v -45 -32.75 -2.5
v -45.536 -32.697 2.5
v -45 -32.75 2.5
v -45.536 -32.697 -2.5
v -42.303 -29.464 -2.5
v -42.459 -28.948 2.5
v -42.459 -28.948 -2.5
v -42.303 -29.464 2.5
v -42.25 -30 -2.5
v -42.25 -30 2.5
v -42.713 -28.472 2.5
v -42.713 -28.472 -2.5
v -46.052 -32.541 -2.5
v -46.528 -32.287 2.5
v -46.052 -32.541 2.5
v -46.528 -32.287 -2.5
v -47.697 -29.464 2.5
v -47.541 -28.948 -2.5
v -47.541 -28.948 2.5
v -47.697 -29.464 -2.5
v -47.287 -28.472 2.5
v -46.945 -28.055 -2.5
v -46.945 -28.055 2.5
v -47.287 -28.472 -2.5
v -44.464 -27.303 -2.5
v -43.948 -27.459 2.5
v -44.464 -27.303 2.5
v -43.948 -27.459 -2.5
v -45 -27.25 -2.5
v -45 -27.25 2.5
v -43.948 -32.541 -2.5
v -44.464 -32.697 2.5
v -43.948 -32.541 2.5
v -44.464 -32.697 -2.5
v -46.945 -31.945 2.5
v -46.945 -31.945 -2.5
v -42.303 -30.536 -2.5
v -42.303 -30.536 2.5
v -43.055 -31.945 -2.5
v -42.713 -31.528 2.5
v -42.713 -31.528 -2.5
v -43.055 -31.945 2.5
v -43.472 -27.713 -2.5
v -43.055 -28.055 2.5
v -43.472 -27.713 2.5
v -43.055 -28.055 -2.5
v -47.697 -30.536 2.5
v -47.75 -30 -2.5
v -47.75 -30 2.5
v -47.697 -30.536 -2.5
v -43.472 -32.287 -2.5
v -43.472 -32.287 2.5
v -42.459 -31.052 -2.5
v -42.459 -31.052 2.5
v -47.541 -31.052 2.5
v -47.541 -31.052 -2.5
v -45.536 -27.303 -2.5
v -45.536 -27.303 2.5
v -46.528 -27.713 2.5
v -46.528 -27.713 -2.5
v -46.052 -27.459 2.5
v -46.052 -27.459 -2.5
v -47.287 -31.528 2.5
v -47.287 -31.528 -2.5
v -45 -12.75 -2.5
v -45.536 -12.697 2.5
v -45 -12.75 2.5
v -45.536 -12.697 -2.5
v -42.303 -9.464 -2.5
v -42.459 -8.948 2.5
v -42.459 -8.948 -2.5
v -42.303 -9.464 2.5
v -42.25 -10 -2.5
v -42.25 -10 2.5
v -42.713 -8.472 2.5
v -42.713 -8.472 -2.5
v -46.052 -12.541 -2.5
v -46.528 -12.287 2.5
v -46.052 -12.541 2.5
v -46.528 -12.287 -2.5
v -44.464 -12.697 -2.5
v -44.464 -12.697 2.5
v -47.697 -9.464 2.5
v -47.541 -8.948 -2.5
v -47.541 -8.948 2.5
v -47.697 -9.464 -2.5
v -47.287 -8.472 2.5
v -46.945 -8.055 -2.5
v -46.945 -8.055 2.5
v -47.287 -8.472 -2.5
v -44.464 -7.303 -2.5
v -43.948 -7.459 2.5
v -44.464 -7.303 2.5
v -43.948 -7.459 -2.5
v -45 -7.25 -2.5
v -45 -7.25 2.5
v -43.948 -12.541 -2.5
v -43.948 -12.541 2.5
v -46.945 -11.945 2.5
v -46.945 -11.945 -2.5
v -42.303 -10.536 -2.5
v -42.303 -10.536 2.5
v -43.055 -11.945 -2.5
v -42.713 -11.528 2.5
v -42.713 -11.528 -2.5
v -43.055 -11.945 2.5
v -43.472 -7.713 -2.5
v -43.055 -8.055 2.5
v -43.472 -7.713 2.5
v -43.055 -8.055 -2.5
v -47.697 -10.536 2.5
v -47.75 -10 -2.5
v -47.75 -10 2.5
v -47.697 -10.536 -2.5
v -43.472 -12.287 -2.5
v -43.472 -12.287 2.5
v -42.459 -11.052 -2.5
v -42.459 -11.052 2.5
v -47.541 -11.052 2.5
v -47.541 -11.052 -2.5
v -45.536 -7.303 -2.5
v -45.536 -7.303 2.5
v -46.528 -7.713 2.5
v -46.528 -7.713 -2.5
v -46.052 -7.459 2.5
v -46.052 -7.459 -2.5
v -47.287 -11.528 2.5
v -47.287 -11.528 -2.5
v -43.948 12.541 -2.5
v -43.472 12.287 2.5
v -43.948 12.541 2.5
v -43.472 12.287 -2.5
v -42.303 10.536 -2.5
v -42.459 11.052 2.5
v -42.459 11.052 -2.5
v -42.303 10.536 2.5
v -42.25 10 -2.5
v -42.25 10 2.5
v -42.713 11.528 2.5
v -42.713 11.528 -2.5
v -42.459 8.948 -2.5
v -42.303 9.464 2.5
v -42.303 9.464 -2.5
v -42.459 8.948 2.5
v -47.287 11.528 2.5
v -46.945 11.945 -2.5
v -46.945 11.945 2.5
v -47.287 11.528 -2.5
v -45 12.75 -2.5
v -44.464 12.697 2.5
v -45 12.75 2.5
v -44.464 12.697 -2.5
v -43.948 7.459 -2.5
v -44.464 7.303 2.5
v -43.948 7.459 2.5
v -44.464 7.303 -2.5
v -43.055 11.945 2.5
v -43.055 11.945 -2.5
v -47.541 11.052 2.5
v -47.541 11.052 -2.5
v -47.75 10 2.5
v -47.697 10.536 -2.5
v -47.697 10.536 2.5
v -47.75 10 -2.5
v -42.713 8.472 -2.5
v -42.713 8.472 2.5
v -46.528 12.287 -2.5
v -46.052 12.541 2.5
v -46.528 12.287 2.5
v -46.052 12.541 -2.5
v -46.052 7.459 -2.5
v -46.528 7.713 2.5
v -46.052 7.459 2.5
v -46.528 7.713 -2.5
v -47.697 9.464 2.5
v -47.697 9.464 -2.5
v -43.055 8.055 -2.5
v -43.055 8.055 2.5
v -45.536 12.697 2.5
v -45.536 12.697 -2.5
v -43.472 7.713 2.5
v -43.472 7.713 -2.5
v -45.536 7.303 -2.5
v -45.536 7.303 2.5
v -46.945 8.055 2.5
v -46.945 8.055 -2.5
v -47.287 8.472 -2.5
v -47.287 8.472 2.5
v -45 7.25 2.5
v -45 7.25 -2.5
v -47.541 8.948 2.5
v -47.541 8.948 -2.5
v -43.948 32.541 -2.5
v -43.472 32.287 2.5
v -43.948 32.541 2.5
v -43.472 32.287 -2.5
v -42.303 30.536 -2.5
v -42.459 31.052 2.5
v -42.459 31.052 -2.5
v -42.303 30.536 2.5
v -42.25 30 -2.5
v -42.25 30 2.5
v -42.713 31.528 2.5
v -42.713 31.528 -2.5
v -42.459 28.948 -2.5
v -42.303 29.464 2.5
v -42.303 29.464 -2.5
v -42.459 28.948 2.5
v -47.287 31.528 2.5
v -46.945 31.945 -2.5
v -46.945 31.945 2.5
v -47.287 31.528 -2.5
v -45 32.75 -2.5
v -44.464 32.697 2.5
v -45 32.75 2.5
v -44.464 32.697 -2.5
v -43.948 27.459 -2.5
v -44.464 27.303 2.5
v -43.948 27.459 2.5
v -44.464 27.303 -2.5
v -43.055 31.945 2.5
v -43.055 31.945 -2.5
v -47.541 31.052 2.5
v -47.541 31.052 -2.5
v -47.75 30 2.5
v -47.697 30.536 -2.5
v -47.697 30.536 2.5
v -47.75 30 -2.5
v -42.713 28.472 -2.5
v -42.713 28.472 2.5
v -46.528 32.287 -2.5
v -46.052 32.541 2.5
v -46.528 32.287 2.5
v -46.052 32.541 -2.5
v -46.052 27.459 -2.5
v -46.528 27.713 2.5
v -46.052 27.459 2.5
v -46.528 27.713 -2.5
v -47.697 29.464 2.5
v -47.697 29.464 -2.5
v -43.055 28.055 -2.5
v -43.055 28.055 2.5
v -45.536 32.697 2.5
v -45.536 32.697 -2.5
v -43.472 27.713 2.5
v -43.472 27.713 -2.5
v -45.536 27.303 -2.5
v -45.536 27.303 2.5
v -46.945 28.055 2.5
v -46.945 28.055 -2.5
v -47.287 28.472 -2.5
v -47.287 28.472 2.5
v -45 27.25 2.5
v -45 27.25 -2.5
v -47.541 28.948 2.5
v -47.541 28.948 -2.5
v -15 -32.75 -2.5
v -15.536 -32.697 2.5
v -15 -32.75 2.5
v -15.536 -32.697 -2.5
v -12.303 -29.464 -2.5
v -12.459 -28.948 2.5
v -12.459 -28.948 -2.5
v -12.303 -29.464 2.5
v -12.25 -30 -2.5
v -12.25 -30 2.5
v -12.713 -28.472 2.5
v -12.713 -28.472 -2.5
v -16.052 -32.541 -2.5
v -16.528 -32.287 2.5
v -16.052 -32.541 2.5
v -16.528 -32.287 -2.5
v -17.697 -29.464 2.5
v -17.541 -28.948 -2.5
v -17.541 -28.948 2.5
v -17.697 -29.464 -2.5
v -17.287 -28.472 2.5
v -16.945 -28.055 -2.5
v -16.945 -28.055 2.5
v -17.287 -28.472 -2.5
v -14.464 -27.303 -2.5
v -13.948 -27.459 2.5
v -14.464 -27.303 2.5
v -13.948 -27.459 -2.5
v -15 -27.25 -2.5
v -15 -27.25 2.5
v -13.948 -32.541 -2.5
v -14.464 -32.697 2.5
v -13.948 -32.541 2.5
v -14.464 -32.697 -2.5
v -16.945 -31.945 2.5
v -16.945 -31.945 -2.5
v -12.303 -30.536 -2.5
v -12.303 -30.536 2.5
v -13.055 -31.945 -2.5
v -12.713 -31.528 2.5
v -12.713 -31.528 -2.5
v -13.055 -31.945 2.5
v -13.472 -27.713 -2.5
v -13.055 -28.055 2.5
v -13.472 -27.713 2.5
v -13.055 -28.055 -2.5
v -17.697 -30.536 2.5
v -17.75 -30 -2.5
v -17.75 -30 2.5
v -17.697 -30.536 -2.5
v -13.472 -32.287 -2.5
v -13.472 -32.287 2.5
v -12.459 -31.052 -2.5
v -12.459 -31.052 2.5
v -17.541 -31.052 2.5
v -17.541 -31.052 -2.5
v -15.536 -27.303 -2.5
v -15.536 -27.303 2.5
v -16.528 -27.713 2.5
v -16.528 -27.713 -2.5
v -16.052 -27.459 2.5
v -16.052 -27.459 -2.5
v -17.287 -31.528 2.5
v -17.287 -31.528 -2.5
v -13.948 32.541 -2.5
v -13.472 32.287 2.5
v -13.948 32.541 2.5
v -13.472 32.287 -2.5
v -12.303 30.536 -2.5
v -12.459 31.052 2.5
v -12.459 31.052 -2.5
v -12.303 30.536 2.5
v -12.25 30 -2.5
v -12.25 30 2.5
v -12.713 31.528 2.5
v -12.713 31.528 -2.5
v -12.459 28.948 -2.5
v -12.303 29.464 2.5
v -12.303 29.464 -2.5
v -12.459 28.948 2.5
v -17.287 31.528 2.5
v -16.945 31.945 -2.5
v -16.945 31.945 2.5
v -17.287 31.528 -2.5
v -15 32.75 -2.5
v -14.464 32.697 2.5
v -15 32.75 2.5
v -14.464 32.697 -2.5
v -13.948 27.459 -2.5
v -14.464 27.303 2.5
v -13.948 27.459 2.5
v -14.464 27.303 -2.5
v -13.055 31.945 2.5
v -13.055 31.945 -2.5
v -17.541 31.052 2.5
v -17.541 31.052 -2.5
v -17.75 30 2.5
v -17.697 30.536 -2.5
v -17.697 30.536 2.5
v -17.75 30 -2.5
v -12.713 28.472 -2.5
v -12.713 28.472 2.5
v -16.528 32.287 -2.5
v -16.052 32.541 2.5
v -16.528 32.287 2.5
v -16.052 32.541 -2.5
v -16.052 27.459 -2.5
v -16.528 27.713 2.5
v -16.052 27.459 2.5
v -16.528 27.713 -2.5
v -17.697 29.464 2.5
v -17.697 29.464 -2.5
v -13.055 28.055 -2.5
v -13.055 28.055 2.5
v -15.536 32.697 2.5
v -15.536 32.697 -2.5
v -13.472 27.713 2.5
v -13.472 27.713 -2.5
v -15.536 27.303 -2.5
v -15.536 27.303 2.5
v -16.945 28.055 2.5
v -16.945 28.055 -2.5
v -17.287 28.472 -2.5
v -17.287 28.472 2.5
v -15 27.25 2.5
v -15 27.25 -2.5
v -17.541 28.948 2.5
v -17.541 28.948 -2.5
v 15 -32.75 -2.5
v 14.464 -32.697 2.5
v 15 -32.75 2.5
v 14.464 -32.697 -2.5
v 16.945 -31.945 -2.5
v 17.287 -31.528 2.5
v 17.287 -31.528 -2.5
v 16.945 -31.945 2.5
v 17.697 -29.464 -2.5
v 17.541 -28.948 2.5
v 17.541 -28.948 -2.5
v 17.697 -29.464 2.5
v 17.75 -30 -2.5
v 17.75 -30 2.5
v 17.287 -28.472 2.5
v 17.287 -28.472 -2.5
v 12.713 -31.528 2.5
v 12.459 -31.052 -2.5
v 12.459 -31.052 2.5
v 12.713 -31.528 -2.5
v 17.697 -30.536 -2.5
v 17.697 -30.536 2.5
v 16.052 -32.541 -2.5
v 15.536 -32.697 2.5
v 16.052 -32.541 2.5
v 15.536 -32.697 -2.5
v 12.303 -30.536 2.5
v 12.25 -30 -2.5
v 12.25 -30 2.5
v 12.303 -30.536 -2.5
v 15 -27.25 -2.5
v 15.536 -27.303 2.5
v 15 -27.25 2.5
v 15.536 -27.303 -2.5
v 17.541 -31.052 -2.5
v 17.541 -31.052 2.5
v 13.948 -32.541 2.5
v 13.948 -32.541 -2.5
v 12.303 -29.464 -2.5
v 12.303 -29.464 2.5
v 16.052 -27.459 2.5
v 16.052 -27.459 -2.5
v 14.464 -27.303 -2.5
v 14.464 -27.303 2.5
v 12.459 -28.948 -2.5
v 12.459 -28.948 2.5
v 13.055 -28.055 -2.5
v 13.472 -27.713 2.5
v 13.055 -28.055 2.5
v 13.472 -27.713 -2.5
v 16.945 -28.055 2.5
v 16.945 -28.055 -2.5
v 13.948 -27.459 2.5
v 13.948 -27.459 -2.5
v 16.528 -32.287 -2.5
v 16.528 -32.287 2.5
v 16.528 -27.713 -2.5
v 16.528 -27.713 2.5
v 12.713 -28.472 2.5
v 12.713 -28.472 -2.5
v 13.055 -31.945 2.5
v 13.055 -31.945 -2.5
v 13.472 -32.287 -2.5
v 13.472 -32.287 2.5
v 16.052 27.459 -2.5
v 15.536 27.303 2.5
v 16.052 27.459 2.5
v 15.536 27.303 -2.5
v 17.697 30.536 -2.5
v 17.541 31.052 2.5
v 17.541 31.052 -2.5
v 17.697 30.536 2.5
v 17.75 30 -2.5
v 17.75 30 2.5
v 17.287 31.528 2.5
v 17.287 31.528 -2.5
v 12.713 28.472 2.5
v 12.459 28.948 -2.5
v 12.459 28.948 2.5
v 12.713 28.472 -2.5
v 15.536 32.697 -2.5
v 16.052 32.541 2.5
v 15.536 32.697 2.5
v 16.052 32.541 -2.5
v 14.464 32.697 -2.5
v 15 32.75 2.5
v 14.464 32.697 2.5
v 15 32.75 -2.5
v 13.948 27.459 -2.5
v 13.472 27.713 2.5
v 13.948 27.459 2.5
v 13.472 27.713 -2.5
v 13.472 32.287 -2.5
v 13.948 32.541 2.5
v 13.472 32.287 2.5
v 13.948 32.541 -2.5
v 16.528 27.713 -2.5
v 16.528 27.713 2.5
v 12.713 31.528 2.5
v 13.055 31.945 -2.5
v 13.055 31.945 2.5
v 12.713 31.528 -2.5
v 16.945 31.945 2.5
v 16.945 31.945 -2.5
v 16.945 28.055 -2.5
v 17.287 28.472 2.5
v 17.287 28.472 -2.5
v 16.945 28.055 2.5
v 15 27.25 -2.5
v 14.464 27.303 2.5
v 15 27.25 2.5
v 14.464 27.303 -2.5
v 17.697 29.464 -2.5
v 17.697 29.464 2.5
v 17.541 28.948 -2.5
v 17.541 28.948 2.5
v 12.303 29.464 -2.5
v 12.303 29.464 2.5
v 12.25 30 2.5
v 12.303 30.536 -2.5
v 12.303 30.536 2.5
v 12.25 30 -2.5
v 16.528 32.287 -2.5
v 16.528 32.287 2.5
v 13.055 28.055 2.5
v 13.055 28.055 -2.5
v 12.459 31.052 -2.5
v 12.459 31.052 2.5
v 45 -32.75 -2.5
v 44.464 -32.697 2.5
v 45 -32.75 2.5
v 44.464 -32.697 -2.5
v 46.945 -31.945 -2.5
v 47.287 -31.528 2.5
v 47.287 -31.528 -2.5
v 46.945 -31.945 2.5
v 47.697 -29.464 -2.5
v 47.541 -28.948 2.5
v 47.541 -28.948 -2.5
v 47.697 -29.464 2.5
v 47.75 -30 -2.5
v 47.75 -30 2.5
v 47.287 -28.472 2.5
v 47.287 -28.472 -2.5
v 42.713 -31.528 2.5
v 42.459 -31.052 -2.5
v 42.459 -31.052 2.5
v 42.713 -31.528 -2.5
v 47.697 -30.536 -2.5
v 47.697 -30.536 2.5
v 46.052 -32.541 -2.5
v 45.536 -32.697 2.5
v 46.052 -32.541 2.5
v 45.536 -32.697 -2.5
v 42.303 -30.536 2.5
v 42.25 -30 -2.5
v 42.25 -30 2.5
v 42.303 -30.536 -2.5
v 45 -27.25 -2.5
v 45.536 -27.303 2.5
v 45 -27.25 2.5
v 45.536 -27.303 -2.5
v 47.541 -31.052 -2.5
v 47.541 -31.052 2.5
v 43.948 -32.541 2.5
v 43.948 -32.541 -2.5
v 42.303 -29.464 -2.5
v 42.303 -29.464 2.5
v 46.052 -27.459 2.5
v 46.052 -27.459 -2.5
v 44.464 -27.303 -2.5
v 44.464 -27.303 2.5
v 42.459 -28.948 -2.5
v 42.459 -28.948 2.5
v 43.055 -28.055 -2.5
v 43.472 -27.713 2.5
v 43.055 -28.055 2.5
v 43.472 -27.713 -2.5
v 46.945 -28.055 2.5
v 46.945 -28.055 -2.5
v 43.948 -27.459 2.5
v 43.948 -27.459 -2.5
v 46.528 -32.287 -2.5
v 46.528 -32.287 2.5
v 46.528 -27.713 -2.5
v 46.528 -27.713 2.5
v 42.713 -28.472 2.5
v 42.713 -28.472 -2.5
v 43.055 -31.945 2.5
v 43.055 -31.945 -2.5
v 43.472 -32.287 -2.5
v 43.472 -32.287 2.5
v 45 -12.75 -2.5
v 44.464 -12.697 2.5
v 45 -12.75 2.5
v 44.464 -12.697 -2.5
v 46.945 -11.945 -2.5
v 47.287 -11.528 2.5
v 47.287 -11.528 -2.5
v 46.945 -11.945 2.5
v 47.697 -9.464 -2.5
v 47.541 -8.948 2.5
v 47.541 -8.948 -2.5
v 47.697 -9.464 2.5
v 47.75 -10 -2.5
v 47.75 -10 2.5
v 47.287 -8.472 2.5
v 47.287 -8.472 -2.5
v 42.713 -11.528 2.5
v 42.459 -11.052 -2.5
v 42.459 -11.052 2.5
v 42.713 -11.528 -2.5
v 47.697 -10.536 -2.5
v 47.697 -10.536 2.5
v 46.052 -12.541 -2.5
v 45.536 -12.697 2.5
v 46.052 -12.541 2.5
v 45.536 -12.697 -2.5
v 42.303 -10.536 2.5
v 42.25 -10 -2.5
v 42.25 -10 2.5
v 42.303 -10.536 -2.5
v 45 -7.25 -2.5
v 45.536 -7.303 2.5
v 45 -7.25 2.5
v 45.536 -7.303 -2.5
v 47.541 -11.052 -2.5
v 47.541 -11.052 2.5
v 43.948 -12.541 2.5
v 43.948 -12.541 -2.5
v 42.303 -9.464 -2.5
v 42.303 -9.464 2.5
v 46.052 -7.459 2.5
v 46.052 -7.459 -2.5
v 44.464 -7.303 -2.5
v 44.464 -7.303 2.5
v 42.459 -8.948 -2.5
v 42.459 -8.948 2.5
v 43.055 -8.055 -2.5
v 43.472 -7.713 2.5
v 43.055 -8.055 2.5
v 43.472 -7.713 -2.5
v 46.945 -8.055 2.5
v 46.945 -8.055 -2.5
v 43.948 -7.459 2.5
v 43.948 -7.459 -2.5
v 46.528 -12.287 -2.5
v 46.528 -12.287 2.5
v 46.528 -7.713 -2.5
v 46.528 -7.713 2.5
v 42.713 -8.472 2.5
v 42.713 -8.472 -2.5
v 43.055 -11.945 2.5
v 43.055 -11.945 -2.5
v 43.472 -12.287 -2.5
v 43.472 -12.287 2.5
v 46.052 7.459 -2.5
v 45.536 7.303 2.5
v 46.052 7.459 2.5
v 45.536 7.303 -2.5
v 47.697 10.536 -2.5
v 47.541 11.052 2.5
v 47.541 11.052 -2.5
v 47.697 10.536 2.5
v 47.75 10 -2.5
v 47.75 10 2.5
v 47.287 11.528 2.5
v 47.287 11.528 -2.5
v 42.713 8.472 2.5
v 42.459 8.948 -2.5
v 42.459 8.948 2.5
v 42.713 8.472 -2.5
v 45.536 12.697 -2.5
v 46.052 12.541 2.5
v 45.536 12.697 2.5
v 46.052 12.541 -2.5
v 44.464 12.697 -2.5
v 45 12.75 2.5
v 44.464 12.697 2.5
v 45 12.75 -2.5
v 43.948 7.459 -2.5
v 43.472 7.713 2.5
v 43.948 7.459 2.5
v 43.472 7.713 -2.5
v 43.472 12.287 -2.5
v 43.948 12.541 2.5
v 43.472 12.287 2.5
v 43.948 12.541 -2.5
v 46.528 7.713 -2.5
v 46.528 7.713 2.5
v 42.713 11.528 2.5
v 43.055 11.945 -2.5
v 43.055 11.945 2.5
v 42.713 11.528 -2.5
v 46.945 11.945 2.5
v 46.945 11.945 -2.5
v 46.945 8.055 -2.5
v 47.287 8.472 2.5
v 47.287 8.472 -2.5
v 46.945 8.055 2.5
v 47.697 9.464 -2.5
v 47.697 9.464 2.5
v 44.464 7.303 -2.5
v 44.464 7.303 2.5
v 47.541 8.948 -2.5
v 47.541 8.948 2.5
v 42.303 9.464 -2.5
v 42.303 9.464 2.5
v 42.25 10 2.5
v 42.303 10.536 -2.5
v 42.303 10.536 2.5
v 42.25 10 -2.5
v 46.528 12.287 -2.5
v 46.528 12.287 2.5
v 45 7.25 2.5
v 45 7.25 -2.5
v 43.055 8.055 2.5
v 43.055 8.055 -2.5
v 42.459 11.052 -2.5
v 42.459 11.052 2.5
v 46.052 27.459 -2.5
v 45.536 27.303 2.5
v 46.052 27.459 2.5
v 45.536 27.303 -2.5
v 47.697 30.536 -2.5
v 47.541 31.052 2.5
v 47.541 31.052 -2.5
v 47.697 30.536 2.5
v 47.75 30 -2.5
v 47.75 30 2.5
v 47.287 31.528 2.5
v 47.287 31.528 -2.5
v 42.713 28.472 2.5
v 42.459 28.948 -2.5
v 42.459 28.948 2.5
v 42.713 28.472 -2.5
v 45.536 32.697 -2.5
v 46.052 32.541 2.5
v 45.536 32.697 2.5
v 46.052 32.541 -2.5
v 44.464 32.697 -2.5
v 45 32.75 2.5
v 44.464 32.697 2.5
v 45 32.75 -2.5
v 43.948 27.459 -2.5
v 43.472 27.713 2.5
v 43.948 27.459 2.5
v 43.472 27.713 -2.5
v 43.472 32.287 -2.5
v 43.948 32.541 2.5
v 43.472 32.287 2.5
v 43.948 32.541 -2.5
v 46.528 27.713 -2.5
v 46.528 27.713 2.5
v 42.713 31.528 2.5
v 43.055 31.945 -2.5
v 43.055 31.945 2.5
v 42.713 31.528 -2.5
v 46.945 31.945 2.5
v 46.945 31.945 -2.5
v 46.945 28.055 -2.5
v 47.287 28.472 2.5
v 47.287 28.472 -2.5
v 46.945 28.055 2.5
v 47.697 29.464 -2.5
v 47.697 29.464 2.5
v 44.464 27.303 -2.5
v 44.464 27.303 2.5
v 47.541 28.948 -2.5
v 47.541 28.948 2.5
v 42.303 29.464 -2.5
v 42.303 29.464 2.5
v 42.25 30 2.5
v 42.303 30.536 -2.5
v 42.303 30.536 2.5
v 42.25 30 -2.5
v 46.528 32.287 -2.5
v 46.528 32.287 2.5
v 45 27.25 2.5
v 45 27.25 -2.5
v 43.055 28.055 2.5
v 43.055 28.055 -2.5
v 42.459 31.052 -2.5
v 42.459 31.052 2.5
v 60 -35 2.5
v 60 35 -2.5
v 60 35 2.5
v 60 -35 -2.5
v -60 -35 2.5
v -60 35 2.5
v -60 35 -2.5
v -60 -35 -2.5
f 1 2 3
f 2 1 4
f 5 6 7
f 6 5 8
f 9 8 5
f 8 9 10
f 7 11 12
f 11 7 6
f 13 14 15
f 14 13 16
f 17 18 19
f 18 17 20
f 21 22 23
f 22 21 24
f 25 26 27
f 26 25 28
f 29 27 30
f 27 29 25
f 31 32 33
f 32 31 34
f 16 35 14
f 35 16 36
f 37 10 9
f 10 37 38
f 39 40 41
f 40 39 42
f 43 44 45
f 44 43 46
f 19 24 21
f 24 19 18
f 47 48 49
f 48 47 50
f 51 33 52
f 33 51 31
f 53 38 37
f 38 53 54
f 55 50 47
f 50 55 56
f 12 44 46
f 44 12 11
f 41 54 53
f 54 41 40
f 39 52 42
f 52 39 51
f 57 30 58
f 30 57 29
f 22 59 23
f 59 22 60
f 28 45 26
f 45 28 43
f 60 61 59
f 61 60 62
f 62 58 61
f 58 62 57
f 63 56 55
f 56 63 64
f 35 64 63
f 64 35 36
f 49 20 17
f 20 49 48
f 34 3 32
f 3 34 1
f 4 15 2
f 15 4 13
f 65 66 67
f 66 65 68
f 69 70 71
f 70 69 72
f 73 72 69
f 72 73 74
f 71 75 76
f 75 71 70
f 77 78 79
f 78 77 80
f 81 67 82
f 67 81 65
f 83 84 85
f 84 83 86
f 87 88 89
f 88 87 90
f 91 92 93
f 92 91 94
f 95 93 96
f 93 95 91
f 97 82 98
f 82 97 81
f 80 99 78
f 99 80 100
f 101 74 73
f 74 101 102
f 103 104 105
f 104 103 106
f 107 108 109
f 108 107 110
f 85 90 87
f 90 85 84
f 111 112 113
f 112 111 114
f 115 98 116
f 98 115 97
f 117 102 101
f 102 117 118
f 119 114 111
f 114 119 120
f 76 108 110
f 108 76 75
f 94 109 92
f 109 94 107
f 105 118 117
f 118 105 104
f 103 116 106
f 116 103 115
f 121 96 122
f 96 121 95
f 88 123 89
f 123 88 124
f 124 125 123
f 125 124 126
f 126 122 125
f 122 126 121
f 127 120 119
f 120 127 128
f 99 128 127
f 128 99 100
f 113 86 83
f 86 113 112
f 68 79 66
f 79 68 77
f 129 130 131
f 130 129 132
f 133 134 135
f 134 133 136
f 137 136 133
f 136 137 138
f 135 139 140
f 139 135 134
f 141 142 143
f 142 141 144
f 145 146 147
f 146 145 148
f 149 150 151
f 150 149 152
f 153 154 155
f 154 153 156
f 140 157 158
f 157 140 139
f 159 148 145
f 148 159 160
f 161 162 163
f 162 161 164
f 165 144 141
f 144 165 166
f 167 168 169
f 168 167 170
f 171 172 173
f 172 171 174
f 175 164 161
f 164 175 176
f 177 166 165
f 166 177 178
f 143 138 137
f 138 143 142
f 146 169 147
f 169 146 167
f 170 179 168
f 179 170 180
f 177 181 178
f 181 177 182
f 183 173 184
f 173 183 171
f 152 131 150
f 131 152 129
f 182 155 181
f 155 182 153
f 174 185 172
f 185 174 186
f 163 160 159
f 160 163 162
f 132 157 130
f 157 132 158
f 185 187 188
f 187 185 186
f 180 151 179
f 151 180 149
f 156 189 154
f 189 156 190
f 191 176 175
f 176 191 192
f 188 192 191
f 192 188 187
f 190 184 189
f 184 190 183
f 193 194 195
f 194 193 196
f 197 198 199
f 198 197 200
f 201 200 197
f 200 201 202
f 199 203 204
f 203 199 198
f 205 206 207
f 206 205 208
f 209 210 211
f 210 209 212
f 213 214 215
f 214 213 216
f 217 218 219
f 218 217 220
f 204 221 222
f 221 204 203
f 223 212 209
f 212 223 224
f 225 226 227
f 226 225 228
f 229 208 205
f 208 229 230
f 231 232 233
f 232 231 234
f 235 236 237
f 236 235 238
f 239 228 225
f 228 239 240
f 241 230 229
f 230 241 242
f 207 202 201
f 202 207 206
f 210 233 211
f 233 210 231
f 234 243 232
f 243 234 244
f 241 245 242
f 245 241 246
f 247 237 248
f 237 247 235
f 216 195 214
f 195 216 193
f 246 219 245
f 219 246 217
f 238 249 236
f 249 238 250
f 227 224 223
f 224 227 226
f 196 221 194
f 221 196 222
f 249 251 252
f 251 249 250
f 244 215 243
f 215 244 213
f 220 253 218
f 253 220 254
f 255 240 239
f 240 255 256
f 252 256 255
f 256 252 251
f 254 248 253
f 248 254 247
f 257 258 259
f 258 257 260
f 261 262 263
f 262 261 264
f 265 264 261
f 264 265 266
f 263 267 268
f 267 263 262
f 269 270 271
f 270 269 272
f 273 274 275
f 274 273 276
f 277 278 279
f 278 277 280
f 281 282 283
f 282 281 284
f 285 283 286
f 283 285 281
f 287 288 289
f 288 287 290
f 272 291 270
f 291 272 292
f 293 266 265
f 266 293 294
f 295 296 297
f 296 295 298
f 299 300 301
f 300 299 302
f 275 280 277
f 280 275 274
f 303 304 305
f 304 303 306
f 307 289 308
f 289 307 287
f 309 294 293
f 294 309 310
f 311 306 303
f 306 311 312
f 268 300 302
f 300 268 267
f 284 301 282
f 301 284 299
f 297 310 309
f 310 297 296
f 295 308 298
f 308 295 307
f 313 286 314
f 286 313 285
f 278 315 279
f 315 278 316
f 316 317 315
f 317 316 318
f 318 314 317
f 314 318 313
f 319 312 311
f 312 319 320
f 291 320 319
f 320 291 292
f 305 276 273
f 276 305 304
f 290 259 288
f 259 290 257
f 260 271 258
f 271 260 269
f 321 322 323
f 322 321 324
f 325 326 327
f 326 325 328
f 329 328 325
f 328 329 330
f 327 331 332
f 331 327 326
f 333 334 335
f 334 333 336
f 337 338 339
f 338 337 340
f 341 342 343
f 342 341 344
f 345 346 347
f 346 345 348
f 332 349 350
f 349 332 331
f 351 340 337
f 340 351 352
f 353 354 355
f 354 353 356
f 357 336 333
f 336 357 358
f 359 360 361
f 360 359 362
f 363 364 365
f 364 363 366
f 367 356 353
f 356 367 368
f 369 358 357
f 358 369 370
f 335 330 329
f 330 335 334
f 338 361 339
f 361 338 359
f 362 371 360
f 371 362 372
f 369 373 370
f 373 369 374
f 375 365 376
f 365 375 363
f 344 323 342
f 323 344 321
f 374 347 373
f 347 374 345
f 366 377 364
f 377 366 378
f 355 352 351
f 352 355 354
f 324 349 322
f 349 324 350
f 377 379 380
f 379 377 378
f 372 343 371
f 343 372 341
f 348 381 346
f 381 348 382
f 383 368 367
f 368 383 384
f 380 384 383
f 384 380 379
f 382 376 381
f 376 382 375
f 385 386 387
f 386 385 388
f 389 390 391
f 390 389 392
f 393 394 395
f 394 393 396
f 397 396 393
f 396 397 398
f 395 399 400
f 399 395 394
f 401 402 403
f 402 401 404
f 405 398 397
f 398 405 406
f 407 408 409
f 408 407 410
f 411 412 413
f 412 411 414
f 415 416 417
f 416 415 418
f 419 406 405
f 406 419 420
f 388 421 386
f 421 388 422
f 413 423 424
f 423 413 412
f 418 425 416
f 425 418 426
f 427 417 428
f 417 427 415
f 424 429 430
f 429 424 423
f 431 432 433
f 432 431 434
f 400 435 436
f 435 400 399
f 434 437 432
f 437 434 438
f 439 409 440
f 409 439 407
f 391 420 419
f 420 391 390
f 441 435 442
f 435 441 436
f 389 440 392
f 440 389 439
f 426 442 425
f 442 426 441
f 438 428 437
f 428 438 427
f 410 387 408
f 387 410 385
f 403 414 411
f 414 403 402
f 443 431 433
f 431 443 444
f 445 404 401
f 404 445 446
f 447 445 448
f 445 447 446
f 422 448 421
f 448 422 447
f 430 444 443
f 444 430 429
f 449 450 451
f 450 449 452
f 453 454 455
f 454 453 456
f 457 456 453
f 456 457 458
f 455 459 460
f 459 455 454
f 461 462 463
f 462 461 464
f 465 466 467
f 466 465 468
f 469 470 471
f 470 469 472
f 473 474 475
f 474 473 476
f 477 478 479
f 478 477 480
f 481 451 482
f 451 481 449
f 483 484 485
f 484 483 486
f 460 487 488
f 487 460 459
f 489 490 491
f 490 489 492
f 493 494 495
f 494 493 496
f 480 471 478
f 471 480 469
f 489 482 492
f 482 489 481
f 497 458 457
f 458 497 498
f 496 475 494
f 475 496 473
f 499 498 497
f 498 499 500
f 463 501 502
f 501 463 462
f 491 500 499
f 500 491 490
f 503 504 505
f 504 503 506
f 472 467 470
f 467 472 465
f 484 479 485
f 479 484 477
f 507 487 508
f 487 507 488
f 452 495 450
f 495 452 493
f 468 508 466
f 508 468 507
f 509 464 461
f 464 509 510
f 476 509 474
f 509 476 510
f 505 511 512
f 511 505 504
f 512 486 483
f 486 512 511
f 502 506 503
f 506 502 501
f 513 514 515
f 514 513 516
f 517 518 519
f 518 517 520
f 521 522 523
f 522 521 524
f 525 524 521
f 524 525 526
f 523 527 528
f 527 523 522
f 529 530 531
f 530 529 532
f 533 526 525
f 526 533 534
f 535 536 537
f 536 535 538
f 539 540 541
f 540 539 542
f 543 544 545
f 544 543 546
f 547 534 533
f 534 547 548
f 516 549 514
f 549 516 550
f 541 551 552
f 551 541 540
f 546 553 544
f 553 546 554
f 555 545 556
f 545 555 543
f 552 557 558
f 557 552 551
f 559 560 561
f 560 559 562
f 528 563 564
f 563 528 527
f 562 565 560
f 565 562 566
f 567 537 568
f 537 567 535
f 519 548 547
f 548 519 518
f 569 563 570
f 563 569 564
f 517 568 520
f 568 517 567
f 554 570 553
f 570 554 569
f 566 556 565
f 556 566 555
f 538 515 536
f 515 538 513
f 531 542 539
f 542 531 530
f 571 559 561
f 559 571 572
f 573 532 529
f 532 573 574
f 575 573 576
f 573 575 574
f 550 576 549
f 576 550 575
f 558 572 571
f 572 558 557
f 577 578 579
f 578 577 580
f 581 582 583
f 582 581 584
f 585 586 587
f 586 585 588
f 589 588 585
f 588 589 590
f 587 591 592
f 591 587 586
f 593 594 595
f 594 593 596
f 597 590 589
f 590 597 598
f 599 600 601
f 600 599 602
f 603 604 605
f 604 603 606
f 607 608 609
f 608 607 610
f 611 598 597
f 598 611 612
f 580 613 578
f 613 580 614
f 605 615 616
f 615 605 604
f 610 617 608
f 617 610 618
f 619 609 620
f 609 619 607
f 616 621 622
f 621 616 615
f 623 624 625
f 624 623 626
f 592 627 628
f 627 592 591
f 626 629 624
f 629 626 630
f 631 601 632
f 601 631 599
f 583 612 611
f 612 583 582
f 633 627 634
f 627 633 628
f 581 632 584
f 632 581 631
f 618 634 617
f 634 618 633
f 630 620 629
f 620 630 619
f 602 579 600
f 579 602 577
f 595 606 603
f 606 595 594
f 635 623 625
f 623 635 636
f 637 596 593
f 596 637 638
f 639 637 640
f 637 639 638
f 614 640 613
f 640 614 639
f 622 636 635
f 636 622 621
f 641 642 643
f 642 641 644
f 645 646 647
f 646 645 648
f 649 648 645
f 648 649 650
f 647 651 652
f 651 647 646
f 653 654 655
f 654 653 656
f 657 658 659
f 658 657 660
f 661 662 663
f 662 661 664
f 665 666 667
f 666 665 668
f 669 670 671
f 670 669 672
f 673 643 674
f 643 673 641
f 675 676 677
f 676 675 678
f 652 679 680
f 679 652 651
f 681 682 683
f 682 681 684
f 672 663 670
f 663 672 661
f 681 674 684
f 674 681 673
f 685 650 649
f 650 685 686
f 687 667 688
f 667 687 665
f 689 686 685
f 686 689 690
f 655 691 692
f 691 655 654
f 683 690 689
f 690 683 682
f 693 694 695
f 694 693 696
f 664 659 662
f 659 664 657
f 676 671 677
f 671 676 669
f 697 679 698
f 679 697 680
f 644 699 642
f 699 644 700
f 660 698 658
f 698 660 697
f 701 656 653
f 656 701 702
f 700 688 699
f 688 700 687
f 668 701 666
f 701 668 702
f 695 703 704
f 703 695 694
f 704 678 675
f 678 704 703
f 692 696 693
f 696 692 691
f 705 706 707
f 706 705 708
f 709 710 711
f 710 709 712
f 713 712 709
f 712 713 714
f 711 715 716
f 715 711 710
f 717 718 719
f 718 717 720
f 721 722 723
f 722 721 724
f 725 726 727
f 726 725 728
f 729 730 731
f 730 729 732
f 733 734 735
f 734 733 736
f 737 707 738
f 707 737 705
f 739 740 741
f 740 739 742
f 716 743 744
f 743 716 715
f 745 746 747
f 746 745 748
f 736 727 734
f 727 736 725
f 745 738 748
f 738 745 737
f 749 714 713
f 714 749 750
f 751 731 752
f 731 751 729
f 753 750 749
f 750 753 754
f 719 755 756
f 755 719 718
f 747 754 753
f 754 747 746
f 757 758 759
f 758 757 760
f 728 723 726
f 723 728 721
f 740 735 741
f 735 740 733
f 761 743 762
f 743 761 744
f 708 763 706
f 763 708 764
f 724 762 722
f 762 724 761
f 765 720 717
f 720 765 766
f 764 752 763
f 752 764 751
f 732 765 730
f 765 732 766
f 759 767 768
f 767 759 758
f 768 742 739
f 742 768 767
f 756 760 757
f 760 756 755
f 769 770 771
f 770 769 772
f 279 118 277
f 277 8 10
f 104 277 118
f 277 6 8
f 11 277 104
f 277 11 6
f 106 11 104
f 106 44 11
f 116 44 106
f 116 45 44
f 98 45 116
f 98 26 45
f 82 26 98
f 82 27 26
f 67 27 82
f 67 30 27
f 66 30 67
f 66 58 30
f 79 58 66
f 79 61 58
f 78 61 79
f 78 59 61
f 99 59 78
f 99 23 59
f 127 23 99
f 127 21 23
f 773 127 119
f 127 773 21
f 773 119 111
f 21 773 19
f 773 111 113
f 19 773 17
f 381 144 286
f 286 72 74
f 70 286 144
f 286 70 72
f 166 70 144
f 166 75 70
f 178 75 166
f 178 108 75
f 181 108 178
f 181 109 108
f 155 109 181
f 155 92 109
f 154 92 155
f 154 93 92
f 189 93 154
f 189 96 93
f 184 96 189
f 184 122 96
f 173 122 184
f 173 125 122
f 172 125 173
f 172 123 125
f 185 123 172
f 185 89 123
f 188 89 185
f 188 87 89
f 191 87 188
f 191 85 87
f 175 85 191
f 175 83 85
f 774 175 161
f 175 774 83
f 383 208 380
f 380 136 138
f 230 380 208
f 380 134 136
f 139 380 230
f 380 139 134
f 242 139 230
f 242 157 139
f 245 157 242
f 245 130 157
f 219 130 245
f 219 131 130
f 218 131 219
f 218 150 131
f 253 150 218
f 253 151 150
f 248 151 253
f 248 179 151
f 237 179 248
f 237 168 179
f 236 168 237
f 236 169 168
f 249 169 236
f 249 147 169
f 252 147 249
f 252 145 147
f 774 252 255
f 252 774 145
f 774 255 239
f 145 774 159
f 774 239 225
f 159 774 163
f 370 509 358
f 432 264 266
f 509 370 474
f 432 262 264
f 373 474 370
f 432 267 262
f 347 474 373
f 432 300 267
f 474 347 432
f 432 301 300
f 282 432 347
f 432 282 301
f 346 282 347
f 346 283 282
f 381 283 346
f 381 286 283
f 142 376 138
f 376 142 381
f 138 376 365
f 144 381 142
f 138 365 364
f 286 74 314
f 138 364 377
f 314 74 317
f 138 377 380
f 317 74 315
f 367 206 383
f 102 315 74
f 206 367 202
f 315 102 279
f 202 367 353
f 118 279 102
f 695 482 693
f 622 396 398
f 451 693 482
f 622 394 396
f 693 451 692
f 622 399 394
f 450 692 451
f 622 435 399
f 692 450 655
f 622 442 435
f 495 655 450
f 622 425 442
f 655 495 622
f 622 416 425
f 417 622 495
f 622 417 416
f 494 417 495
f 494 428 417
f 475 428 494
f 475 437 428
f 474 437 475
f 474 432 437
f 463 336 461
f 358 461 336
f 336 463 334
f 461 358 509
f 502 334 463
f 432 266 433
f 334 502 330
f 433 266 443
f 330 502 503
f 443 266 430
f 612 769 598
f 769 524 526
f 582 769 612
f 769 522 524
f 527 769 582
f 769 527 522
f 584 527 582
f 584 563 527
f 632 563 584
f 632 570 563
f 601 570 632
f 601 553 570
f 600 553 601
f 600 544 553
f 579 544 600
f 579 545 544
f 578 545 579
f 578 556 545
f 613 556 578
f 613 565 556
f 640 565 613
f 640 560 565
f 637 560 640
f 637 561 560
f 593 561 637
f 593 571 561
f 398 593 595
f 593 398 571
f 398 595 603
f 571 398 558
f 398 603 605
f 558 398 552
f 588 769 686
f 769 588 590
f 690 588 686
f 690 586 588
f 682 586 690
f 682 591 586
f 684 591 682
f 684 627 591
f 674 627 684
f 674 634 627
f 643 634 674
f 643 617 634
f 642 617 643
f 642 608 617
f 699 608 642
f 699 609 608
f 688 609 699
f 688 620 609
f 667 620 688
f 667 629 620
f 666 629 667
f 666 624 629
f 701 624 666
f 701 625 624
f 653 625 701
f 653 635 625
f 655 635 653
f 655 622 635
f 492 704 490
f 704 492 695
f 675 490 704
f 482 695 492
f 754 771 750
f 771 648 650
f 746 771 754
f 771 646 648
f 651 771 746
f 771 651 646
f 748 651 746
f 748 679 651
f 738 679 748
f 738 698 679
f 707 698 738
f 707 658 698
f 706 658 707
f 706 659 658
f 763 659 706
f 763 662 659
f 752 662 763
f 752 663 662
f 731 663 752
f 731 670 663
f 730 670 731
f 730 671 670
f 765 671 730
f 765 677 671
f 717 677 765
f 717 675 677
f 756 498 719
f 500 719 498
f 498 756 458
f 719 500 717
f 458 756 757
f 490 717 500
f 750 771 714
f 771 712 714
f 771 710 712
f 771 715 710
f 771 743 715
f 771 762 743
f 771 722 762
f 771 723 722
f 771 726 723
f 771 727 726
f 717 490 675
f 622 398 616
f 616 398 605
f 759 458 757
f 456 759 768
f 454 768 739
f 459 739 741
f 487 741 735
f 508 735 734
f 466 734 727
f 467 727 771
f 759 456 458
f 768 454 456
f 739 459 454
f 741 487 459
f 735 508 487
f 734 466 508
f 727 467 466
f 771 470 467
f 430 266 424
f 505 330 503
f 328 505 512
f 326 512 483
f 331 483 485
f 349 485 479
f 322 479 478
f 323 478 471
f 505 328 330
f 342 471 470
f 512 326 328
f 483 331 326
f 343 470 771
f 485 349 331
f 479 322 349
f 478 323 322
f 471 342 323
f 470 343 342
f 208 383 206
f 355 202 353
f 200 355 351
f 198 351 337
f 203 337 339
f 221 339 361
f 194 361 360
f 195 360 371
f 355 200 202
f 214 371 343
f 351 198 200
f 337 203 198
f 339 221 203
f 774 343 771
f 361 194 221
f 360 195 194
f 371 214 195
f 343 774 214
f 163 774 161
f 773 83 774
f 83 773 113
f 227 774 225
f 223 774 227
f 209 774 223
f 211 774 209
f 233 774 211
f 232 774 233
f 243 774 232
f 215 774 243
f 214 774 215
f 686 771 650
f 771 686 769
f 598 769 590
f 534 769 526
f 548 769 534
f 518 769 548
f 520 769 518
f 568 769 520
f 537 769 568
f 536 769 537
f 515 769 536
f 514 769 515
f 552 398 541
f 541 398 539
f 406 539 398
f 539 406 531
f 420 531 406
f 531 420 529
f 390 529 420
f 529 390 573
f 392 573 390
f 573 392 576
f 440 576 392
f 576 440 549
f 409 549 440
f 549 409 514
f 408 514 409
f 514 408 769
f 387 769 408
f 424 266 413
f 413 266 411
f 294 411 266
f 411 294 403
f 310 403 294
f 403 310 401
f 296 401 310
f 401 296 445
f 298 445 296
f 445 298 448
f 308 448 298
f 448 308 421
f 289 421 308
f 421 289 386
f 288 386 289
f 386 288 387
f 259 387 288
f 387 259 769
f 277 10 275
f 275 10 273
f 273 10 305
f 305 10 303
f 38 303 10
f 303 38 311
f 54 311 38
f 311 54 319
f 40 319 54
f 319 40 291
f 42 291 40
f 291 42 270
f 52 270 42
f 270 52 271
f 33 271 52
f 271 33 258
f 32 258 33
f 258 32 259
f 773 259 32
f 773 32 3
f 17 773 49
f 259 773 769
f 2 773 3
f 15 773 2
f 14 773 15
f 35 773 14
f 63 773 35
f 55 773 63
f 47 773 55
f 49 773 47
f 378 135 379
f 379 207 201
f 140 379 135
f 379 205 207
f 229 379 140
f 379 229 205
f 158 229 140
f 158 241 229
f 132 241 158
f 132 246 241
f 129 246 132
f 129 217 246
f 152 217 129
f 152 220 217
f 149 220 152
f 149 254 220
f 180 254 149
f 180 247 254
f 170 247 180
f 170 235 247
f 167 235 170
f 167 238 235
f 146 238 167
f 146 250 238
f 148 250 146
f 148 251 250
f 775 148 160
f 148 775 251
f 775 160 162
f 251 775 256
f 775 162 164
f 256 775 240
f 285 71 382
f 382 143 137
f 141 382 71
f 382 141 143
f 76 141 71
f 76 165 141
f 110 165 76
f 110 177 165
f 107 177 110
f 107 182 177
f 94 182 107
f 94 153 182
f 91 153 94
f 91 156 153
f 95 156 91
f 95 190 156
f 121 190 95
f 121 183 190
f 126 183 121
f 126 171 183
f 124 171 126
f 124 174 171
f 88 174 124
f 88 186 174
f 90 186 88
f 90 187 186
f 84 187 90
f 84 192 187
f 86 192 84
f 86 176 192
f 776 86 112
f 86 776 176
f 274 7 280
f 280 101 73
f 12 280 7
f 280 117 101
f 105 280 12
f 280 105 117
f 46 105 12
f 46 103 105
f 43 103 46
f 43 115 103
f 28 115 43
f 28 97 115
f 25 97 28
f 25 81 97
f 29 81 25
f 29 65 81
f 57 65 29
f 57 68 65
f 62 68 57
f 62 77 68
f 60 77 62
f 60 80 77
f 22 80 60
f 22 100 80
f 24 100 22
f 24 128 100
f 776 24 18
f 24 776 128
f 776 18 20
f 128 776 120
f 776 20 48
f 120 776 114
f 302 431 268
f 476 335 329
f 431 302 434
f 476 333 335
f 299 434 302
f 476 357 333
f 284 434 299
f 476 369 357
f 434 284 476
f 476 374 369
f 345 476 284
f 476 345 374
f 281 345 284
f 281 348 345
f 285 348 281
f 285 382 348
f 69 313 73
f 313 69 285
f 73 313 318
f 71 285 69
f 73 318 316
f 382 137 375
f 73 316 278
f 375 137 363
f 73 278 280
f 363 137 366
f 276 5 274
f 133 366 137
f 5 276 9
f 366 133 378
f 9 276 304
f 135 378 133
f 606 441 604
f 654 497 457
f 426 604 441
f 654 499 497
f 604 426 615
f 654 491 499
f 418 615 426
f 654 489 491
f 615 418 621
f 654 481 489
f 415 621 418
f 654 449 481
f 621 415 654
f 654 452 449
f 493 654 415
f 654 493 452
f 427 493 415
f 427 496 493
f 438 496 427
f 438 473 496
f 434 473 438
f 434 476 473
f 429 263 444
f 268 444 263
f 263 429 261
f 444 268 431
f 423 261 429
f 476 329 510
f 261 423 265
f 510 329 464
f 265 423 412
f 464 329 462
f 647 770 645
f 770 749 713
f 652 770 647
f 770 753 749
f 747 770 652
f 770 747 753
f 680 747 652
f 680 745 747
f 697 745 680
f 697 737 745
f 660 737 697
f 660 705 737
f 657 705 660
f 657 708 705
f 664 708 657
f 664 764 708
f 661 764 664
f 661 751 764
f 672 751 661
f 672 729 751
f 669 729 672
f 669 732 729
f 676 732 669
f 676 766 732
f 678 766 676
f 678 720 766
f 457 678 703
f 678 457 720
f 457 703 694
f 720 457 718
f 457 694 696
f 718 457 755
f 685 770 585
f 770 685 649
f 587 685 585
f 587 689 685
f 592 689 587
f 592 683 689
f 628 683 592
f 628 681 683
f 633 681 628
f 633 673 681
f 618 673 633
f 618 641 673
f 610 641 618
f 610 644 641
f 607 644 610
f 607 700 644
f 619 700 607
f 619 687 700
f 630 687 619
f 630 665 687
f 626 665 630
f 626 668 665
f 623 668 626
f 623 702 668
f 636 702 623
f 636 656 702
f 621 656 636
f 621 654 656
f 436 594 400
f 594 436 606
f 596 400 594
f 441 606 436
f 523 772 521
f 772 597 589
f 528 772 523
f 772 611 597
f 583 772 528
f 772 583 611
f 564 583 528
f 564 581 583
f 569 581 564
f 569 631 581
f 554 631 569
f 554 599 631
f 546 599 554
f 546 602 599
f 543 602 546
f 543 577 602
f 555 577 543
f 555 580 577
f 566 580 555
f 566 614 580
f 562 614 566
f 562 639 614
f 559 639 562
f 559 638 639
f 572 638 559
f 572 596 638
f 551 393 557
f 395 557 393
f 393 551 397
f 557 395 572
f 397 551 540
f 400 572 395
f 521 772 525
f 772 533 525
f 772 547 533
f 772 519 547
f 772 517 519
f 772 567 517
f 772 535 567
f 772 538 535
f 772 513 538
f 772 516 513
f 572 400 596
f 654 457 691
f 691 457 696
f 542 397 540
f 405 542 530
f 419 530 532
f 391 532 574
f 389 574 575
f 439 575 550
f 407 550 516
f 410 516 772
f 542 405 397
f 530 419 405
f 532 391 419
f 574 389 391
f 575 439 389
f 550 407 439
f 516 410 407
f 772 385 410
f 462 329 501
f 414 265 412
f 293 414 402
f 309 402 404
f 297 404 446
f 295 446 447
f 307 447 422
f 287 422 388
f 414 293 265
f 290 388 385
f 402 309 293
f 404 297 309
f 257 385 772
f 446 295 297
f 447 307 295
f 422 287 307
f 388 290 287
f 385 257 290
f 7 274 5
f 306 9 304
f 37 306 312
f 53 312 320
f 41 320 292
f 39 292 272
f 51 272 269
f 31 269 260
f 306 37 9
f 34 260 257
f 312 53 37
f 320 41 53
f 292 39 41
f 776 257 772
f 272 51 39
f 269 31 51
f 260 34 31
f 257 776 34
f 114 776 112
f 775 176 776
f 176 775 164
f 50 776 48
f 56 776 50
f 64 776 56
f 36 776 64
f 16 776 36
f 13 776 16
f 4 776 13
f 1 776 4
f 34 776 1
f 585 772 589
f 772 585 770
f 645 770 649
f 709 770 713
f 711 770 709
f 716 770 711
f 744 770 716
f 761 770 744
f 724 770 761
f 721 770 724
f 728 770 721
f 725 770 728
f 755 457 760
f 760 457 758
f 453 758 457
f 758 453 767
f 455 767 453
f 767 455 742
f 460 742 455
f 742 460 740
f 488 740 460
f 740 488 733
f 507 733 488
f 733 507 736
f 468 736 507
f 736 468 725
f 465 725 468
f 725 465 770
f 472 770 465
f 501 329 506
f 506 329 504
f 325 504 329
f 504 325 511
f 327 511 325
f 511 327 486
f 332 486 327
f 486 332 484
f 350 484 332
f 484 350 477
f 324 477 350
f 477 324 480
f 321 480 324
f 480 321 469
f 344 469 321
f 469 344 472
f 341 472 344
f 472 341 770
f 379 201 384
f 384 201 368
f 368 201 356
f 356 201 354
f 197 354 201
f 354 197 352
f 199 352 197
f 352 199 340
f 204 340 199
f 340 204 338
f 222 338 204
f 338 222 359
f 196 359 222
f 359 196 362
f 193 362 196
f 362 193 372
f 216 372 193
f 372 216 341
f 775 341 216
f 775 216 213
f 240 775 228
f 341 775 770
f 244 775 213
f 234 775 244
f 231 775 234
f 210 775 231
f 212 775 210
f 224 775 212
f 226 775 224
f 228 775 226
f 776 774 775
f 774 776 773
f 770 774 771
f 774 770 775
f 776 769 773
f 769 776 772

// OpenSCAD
$fn = 32;

// ----------------------------------------------------------------------
// Perforated panel 120 x 70 x 5
// 4 x 4 Ø5.5 holes, frame layout
// ----------------------------------------------------------------------

// --- parameters (mm) ---
panel = [120, 70, 5];  // overall size (x, y, z)
hole_d = 5.5;          // hole diameter
pitch_x = 30;          // hole pitch along X
pitch_y = 20;          // hole pitch along Y

// --- derived feature positions (mm) ---
margin = hole_d / 2 + 2;            // = 4.75   clearance from the panel edge
cols = floor((panel[0] - 2 * margin) / pitch_x) + 1;  // = 4   how many columns fit in X
rows = floor((panel[1] - 2 * margin) / pitch_y) + 1;  // = 4   how many rows fit in Y
span_x = (cols - 1) * pitch_x + 0;  // = 90   width of the field
span_y = (rows - 1) * pitch_y;      // = 60   height of the field
origin_x = -span_x / 2;             // = -45   X of the first hole
origin_y = -span_y / 2;             // = -30   Y of the first row
holes = 2 * cols + 2 * (rows - 2);  // = 12   holes around the frame
feature_centers = [
  [origin_x + 0 * pitch_x, origin_y + 0 * pitch_y],
  [origin_x + 0 * pitch_x, origin_y + 1 * pitch_y],
  [origin_x + 0 * pitch_x, origin_y + 2 * pitch_y],
  [origin_x + 0 * pitch_x, origin_y + 3 * pitch_y],
  [origin_x + 1 * pitch_x, origin_y + 0 * pitch_y],
  [origin_x + 1 * pitch_x, origin_y + 3 * pitch_y],
  [origin_x + 2 * pitch_x, origin_y + 0 * pitch_y],
  [origin_x + 2 * pitch_x, origin_y + 3 * pitch_y],
  [origin_x + 3 * pitch_x, origin_y + 0 * pitch_y],
  [origin_x + 3 * pitch_x, origin_y + 1 * pitch_y],
  [origin_x + 3 * pitch_x, origin_y + 2 * pitch_y],
  [origin_x + 3 * pitch_x, origin_y + 3 * pitch_y]
];   // hole centres, used verbatim by the cutter loop

// panel outline, every hole through
difference() {
  cube(panel, center = true);
  for (centre = feature_centers)
    translate([centre[0], centre[1], 0])
      cylinder(d = hole_d, h = panel[2] + 2, center = true);
}
